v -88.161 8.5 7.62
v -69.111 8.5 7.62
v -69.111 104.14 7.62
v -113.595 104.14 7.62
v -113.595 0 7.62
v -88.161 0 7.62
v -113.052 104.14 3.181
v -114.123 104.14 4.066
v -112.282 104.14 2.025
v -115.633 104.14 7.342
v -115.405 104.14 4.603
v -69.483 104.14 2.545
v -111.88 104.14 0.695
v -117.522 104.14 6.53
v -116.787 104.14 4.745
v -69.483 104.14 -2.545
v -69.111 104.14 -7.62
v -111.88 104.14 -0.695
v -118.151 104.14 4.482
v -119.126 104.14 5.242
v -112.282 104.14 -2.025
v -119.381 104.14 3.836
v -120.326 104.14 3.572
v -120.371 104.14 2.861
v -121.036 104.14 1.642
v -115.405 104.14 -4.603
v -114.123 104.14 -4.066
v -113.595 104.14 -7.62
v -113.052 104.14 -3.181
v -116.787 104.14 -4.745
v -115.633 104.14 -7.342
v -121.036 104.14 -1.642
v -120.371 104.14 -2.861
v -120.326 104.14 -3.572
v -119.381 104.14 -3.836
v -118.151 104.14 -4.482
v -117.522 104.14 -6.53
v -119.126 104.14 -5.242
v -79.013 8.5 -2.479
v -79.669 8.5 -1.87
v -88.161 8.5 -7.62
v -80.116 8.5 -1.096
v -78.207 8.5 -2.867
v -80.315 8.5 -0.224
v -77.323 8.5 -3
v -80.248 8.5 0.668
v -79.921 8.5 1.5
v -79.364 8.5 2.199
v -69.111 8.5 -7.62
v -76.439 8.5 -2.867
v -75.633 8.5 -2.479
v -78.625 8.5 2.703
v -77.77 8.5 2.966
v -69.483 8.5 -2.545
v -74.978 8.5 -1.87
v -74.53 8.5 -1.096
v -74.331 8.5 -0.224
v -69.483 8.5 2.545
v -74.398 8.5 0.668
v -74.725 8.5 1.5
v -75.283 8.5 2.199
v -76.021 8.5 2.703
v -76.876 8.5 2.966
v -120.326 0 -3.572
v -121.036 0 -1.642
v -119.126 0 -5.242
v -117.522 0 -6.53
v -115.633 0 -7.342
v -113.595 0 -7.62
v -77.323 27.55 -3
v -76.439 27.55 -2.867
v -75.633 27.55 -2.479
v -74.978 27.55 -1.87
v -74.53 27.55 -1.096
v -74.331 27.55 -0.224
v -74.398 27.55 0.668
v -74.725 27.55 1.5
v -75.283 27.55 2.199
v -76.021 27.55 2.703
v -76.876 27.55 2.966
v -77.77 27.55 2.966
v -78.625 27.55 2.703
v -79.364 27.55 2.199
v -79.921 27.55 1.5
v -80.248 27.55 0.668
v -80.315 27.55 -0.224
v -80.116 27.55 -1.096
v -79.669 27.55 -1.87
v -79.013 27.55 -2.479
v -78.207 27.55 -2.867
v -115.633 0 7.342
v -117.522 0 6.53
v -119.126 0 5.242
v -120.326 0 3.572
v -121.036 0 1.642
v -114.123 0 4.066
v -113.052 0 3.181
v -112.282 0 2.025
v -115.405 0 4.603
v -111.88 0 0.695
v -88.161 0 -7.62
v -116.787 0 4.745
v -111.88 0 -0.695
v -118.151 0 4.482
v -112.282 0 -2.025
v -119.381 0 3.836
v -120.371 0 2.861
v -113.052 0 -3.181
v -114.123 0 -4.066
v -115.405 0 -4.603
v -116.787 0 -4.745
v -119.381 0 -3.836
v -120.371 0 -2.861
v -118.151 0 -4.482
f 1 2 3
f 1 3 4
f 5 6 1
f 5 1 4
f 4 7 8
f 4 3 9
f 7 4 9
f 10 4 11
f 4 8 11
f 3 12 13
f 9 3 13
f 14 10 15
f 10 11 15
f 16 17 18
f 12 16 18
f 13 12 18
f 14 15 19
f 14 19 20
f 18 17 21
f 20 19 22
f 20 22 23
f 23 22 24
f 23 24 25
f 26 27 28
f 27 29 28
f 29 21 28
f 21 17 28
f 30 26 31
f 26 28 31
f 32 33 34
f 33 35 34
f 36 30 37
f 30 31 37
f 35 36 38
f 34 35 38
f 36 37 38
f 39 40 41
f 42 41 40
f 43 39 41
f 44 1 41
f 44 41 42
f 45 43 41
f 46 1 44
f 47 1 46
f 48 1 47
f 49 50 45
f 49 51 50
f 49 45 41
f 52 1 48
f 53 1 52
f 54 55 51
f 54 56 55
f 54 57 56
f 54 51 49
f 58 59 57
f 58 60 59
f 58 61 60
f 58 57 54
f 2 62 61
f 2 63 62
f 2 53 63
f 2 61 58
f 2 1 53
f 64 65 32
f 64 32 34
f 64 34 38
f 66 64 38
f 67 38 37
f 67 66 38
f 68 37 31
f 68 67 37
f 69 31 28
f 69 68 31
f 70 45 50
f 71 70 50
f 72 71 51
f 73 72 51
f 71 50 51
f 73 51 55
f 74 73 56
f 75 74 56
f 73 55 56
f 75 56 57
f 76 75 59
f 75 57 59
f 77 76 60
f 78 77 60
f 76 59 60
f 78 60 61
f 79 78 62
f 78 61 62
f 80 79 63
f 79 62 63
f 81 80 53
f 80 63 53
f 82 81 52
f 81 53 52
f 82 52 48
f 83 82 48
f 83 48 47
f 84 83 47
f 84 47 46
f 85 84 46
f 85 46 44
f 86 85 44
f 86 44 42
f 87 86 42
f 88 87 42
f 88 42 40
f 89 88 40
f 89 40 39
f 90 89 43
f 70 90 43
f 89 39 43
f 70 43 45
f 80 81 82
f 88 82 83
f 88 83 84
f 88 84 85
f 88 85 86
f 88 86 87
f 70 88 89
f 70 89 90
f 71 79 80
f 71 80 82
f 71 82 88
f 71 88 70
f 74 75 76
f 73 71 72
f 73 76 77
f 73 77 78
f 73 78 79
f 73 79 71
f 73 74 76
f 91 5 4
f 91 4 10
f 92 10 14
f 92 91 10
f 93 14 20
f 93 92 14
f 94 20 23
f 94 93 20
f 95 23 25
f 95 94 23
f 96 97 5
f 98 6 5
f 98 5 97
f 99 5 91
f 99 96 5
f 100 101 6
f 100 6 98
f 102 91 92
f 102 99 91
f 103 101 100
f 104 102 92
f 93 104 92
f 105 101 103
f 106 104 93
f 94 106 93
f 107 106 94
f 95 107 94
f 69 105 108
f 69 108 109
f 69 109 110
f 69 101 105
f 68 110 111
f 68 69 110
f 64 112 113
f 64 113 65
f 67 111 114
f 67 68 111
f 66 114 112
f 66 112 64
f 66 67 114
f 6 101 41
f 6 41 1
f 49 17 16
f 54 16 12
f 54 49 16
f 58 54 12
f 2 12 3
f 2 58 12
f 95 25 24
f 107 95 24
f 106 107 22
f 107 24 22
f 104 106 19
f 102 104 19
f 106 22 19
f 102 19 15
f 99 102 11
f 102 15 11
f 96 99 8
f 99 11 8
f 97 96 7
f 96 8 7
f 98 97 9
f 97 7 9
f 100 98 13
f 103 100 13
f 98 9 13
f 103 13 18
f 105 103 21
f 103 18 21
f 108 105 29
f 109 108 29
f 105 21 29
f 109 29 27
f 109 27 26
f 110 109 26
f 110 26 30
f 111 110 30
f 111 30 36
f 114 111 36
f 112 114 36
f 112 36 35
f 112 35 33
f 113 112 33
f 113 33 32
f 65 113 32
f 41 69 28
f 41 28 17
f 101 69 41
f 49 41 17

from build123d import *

# Parameters (mm, degrees)
BOSS_EXTRUDE1_DEPTH = 104.14
SKETCH3_R           = 4.75
CUT_EXTRUDE4_DEPTH  = 104.14
SKETCH4_W           = 19.05
SKETCH4_H           = 15.24
CUT_EXTRUDE5_DEPTH  = 8.5
SKETCH5_R           = 3
CUT_EXTRUDE6_DEPTH  = 19.05


with BuildPart() as part:
    # Sketch1 → Boss-Extrude1 (new body)
    with BuildSketch(Plane(origin=(0, 0, 0), x_dir=(1, 0, 0), z_dir=(0, 1, 0))):
        with BuildLine():
            Line((-113.595187486, 7.62), (-69.111187486, 7.62))
            ThreePointArc((-69.111187486, 7.62), (-69.5299981, 0), (-69.111187486, -7.62))
            Line((-69.111187486, -7.62), (-113.595187486, -7.62))
            ThreePointArc((-113.595187486, -7.62), (-121.215187486, 0), (-113.595187486, 7.62))
        make_face()
    extrude(amount=BOSS_EXTRUDE1_DEPTH)

    # Sketch3 → Cut-Extrude4 (cut)
    with BuildSketch(Plane(origin=(0, 104.14, 0), x_dir=(1, 0, 0), z_dir=(0, 1, 0))):
        with Locations((-116.578948711, 0)):
            Circle(SKETCH3_R)
    extrude(amount=-CUT_EXTRUDE4_DEPTH, mode=Mode.SUBTRACT)

    # Sketch4 → Cut-Extrude5 (cut)
    with BuildSketch(Plane.XZ):
        with Locations((-78.636187486, 0)):
            Rectangle(SKETCH4_W, SKETCH4_H)
    extrude(amount=-CUT_EXTRUDE5_DEPTH, mode=Mode.SUBTRACT)

    # Sketch5 → Cut-Extrude6 (cut)
    with BuildSketch(Plane.XZ.offset(-8.5)):
        with Locations(Location((-77.323071778, 0, 0), (0, 0, 270))):
            Circle(SKETCH5_R)
    extrude(amount=-CUT_EXTRUDE6_DEPTH, mode=Mode.SUBTRACT)


solid = part.part
